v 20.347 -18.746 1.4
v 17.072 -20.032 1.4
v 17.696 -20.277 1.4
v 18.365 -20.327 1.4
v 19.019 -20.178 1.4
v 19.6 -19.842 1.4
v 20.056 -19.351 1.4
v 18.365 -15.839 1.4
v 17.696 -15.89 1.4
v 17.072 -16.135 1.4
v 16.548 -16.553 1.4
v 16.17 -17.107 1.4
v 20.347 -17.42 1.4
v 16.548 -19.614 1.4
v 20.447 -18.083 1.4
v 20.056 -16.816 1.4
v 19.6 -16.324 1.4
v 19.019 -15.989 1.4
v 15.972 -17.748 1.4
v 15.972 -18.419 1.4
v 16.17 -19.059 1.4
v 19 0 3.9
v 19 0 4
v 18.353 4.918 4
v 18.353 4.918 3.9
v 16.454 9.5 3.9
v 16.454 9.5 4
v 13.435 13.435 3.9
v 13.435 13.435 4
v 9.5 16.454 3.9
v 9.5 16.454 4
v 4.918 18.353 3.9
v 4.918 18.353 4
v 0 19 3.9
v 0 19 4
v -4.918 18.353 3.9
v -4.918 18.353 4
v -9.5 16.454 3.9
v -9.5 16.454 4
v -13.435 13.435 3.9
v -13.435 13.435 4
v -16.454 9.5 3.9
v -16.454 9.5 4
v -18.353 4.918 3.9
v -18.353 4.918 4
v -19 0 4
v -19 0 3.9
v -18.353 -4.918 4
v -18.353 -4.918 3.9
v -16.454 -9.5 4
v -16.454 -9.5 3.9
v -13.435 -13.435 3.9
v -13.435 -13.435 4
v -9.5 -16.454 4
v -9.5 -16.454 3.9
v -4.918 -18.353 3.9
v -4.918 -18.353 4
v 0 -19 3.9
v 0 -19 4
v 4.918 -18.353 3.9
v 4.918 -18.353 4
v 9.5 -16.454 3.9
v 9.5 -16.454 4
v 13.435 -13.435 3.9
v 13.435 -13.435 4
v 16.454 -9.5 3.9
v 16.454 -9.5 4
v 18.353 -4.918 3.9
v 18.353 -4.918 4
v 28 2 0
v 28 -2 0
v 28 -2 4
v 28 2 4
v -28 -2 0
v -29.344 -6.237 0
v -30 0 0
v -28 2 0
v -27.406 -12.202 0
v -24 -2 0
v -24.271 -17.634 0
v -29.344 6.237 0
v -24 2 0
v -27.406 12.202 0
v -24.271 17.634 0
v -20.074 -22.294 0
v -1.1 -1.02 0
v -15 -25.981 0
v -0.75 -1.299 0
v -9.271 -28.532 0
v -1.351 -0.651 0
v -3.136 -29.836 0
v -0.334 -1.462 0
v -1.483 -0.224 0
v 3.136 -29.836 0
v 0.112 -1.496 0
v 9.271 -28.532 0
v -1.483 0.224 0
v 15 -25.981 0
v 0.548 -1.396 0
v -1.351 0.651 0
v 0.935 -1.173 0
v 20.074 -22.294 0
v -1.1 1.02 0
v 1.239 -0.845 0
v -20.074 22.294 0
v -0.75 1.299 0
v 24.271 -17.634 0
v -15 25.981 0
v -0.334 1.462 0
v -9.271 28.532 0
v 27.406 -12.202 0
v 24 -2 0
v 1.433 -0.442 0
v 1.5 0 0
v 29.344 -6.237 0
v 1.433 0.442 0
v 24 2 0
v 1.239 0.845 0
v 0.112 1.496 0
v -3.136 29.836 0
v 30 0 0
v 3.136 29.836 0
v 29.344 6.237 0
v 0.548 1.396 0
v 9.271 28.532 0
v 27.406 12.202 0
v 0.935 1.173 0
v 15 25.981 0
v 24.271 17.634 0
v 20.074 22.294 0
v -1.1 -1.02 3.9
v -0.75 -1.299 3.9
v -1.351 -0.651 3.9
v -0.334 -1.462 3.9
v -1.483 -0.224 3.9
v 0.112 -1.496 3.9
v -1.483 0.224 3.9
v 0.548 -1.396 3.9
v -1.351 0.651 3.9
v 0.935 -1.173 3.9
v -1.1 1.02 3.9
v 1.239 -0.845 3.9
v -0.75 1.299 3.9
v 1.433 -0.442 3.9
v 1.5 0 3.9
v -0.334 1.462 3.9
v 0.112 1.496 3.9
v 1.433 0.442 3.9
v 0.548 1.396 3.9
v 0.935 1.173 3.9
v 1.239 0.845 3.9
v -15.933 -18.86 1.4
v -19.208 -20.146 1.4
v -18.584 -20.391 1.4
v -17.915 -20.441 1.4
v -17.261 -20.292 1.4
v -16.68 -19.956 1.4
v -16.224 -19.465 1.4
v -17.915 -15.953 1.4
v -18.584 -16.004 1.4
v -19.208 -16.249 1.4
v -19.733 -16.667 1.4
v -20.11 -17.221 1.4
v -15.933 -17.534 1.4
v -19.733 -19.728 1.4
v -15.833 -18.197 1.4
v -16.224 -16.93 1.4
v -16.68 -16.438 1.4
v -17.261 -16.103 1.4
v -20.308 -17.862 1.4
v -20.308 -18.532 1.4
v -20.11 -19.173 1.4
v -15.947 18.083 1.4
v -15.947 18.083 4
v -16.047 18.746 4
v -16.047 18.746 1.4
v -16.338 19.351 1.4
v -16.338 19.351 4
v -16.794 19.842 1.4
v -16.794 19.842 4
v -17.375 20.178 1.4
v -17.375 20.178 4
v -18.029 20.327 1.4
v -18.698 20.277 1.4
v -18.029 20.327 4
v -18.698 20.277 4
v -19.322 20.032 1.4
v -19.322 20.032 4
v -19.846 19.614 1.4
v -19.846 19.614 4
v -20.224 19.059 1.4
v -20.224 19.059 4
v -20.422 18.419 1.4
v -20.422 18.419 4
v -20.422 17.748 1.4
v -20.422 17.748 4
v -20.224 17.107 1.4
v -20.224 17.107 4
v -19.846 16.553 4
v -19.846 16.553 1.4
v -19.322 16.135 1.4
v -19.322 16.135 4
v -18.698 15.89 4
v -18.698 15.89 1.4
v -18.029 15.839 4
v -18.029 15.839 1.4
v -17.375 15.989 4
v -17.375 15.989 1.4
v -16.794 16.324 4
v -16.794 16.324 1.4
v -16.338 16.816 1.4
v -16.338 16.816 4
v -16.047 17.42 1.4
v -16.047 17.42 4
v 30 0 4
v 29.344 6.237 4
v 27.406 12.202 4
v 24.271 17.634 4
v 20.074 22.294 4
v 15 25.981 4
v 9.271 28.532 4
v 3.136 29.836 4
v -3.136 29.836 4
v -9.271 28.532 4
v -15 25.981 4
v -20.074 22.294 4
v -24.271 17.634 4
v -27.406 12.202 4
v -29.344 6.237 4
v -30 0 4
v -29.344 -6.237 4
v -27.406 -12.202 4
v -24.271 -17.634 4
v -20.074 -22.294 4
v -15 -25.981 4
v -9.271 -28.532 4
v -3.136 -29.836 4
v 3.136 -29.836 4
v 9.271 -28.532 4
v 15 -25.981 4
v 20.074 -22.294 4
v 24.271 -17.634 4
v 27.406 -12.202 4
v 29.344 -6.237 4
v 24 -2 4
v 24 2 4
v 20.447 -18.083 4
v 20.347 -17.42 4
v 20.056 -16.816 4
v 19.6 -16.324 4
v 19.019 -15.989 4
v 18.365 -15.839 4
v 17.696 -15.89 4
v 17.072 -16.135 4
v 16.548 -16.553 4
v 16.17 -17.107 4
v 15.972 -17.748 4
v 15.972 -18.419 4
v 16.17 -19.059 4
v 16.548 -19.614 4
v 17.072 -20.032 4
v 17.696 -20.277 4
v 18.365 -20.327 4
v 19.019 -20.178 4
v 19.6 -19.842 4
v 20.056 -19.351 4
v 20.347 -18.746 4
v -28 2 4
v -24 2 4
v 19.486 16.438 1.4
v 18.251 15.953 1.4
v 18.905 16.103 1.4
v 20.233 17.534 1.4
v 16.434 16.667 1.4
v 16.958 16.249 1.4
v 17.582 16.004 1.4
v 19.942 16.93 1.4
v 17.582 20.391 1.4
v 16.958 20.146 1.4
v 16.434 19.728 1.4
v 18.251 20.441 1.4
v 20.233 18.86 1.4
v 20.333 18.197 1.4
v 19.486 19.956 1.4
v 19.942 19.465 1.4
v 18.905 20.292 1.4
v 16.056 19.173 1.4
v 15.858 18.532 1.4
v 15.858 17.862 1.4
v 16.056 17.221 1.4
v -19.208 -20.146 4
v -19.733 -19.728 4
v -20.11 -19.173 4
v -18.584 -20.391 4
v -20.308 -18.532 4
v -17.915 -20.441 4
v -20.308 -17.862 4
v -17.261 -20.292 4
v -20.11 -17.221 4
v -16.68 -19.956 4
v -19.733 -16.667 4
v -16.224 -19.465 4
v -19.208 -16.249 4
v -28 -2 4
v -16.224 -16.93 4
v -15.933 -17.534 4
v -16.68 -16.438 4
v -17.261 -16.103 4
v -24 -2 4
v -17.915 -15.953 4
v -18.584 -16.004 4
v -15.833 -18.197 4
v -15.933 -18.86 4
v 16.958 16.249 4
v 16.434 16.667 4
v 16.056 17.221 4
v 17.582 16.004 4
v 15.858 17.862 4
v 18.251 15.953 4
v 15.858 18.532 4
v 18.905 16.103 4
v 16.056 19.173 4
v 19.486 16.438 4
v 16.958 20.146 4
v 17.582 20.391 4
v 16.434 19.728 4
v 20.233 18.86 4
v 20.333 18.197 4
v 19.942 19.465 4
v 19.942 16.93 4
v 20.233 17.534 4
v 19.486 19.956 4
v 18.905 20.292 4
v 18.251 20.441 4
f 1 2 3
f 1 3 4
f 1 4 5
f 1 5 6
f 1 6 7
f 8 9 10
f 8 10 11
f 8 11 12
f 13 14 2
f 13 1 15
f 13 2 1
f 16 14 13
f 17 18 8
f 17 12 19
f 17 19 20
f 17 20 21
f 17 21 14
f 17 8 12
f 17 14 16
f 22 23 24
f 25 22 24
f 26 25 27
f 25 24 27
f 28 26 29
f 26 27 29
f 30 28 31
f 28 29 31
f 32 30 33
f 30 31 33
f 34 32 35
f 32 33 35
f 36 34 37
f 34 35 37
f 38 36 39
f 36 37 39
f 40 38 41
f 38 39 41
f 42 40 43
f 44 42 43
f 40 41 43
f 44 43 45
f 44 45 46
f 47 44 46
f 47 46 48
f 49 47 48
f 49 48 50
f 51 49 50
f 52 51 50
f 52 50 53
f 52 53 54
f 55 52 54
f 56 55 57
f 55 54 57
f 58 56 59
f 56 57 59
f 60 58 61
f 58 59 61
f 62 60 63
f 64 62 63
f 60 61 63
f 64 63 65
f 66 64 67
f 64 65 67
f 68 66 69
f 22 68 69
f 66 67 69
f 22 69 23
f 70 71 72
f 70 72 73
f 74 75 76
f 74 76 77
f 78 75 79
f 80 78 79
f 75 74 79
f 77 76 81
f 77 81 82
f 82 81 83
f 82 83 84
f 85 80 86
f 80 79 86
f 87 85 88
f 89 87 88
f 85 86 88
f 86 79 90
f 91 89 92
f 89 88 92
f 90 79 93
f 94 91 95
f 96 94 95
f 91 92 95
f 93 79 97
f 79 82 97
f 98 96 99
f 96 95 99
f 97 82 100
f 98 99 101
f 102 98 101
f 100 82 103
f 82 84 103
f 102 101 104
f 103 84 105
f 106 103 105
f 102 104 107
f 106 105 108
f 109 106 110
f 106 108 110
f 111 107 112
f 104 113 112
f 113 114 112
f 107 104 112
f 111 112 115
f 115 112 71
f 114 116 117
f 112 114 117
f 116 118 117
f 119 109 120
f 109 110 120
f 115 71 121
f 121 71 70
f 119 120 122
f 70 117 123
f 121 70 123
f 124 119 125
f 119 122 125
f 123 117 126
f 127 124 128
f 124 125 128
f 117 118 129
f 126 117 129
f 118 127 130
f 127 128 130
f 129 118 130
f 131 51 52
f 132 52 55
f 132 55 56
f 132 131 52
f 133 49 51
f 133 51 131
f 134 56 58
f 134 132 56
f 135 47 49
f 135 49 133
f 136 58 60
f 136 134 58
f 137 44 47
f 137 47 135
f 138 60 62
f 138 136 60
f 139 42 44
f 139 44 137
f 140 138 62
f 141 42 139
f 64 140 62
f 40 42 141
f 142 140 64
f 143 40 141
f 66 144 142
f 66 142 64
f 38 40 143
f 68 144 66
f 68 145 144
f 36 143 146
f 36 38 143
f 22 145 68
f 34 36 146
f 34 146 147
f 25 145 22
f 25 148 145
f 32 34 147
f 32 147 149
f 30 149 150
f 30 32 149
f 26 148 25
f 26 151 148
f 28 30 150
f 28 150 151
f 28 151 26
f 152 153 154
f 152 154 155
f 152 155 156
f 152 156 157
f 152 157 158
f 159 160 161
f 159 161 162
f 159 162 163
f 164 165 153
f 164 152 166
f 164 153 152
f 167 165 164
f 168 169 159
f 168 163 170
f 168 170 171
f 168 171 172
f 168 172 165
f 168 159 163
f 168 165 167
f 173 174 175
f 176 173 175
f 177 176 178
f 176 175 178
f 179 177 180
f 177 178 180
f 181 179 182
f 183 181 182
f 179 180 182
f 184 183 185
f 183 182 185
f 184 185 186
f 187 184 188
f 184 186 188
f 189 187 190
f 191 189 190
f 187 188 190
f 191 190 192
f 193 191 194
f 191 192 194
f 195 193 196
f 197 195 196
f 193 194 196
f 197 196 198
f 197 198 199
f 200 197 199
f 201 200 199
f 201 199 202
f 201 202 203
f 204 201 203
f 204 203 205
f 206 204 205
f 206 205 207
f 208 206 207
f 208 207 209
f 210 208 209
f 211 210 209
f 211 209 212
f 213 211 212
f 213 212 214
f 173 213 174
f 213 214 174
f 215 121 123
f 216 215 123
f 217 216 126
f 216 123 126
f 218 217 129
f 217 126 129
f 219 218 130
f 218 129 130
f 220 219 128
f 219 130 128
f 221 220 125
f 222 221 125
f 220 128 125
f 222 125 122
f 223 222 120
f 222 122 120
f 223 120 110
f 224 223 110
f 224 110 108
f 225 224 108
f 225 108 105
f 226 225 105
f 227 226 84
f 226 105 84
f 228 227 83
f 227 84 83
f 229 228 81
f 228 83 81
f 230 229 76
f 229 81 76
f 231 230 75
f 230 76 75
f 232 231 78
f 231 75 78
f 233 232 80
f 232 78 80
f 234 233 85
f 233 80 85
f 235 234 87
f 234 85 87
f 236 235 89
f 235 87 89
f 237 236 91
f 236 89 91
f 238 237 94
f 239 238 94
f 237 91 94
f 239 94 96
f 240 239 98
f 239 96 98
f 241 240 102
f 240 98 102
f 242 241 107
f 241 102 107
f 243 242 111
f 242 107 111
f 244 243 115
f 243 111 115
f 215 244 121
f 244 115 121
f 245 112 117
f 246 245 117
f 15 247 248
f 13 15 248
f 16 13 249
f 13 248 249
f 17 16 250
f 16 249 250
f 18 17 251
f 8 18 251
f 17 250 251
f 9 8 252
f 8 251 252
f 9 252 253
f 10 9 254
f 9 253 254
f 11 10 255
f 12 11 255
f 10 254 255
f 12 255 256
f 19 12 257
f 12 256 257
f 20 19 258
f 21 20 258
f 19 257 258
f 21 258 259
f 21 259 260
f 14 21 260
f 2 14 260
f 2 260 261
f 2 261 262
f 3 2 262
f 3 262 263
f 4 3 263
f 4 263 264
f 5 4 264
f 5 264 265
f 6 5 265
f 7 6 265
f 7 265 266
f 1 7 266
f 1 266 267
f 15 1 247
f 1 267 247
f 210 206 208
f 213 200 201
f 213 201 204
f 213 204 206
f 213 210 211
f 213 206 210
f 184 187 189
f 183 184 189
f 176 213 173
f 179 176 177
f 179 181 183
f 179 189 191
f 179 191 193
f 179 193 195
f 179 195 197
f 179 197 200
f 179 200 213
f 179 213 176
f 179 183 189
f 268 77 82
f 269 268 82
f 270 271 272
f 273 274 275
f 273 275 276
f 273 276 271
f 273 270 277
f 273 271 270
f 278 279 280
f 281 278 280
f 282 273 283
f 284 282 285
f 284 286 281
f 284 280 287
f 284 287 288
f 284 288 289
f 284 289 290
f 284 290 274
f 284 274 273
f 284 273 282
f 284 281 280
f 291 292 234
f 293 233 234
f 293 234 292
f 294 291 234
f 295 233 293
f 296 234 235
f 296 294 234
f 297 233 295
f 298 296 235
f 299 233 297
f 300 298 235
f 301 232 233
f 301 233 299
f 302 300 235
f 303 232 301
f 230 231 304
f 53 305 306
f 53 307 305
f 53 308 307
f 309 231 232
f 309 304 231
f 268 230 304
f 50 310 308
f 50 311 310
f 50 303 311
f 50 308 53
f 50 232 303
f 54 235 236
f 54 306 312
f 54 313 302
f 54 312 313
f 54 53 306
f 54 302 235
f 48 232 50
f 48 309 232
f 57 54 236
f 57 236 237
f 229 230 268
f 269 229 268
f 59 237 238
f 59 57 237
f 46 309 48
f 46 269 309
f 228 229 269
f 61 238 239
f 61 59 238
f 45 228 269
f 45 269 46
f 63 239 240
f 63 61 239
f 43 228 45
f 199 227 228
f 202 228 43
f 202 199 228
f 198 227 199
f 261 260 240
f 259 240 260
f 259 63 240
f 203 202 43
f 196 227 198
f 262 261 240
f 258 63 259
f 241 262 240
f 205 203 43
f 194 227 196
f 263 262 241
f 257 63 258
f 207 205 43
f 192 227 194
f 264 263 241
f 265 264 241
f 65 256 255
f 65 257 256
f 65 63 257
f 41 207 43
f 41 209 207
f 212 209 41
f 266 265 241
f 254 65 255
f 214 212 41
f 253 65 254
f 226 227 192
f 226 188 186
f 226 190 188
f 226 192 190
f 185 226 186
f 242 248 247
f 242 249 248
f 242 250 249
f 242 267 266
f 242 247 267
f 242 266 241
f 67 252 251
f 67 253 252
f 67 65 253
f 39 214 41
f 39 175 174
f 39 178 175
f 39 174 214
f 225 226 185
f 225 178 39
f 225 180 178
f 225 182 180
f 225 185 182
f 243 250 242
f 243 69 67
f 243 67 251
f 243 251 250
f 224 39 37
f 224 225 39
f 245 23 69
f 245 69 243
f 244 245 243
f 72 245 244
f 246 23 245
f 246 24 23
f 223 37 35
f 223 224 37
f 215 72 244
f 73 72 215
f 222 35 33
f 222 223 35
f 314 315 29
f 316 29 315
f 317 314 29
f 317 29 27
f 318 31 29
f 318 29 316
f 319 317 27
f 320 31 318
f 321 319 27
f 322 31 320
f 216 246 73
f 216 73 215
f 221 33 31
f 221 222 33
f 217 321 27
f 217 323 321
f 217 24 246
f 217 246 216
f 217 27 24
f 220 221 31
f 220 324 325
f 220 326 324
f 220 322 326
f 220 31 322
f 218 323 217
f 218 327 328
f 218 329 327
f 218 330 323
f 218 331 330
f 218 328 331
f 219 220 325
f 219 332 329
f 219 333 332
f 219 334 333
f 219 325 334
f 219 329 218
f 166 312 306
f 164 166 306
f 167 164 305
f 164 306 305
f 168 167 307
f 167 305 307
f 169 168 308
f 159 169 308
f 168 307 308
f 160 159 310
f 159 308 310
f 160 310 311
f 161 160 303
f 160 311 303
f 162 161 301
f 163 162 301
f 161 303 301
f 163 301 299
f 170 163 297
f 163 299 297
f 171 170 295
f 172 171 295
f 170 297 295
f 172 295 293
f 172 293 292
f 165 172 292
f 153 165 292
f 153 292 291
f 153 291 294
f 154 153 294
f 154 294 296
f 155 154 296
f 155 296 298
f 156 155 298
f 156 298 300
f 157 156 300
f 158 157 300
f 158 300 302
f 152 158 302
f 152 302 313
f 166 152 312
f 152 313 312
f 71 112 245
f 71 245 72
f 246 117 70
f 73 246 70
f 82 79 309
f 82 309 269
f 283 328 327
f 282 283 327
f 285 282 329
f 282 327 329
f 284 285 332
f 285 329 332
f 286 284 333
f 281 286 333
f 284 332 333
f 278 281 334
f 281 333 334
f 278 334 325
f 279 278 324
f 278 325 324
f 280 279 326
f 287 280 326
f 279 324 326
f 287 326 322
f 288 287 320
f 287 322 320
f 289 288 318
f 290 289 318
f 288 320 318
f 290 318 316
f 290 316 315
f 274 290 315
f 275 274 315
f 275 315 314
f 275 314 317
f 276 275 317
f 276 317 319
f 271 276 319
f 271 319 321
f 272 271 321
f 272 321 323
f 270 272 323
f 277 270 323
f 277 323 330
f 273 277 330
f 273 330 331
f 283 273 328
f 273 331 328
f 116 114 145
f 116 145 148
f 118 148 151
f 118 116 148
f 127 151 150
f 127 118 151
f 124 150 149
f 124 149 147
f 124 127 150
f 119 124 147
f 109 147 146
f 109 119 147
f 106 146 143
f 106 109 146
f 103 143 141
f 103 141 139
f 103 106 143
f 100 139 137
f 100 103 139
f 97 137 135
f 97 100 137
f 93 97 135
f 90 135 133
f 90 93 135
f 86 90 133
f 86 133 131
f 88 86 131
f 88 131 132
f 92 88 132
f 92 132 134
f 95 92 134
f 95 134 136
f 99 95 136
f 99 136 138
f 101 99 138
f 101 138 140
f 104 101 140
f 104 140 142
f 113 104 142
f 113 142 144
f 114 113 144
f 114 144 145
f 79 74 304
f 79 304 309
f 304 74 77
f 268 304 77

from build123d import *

# Parameters (mm, degrees)
F0_R     = 30
F0_W     = 4
F0_H     = 4
F0_R_2   = 1.5
F1_DEPTH = 4
F2_R     = 2.25
F3_DEPTH = 2.6
F4_R     = 19
F4_R_2   = 1.5
F5_DEPTH = 0.1


with BuildPart() as f1:
    # F0 (on Top) → F1 (new body)
    with BuildSketch(Plane.XY):
        Circle(F0_R)
        with Locations((-26, 0)):
            Rectangle(F0_W, F0_H, mode=Mode.SUBTRACT)
        Circle(F0_R_2, mode=Mode.SUBTRACT)
        with Locations((26, 0)):
            Rectangle(F0_W, F0_H, mode=Mode.SUBTRACT)
    extrude(amount=F1_DEPTH)

    # F2 (on face) → F3 (cut)
    with BuildSketch(Plane.XY.offset(4)):
        with Locations((-18.197132, 18.083166)):
            Circle(F2_R)
        with Locations((18.083166, 18.197132)):
            Circle(F2_R)
        with Locations((-18.083166, -18.197132)):
            Circle(F2_R)
        with Locations((18.197132, -18.083166)):
            Circle(F2_R)
    extrude(amount=-F3_DEPTH, mode=Mode.SUBTRACT)

    # F4 (on face) → F5 (cut)
    with BuildSketch(Plane.XY.offset(4)):
        Circle(F4_R)
        Circle(F4_R_2, mode=Mode.SUBTRACT)
    extrude(amount=-F5_DEPTH, mode=Mode.SUBTRACT)


solid = f1.part
